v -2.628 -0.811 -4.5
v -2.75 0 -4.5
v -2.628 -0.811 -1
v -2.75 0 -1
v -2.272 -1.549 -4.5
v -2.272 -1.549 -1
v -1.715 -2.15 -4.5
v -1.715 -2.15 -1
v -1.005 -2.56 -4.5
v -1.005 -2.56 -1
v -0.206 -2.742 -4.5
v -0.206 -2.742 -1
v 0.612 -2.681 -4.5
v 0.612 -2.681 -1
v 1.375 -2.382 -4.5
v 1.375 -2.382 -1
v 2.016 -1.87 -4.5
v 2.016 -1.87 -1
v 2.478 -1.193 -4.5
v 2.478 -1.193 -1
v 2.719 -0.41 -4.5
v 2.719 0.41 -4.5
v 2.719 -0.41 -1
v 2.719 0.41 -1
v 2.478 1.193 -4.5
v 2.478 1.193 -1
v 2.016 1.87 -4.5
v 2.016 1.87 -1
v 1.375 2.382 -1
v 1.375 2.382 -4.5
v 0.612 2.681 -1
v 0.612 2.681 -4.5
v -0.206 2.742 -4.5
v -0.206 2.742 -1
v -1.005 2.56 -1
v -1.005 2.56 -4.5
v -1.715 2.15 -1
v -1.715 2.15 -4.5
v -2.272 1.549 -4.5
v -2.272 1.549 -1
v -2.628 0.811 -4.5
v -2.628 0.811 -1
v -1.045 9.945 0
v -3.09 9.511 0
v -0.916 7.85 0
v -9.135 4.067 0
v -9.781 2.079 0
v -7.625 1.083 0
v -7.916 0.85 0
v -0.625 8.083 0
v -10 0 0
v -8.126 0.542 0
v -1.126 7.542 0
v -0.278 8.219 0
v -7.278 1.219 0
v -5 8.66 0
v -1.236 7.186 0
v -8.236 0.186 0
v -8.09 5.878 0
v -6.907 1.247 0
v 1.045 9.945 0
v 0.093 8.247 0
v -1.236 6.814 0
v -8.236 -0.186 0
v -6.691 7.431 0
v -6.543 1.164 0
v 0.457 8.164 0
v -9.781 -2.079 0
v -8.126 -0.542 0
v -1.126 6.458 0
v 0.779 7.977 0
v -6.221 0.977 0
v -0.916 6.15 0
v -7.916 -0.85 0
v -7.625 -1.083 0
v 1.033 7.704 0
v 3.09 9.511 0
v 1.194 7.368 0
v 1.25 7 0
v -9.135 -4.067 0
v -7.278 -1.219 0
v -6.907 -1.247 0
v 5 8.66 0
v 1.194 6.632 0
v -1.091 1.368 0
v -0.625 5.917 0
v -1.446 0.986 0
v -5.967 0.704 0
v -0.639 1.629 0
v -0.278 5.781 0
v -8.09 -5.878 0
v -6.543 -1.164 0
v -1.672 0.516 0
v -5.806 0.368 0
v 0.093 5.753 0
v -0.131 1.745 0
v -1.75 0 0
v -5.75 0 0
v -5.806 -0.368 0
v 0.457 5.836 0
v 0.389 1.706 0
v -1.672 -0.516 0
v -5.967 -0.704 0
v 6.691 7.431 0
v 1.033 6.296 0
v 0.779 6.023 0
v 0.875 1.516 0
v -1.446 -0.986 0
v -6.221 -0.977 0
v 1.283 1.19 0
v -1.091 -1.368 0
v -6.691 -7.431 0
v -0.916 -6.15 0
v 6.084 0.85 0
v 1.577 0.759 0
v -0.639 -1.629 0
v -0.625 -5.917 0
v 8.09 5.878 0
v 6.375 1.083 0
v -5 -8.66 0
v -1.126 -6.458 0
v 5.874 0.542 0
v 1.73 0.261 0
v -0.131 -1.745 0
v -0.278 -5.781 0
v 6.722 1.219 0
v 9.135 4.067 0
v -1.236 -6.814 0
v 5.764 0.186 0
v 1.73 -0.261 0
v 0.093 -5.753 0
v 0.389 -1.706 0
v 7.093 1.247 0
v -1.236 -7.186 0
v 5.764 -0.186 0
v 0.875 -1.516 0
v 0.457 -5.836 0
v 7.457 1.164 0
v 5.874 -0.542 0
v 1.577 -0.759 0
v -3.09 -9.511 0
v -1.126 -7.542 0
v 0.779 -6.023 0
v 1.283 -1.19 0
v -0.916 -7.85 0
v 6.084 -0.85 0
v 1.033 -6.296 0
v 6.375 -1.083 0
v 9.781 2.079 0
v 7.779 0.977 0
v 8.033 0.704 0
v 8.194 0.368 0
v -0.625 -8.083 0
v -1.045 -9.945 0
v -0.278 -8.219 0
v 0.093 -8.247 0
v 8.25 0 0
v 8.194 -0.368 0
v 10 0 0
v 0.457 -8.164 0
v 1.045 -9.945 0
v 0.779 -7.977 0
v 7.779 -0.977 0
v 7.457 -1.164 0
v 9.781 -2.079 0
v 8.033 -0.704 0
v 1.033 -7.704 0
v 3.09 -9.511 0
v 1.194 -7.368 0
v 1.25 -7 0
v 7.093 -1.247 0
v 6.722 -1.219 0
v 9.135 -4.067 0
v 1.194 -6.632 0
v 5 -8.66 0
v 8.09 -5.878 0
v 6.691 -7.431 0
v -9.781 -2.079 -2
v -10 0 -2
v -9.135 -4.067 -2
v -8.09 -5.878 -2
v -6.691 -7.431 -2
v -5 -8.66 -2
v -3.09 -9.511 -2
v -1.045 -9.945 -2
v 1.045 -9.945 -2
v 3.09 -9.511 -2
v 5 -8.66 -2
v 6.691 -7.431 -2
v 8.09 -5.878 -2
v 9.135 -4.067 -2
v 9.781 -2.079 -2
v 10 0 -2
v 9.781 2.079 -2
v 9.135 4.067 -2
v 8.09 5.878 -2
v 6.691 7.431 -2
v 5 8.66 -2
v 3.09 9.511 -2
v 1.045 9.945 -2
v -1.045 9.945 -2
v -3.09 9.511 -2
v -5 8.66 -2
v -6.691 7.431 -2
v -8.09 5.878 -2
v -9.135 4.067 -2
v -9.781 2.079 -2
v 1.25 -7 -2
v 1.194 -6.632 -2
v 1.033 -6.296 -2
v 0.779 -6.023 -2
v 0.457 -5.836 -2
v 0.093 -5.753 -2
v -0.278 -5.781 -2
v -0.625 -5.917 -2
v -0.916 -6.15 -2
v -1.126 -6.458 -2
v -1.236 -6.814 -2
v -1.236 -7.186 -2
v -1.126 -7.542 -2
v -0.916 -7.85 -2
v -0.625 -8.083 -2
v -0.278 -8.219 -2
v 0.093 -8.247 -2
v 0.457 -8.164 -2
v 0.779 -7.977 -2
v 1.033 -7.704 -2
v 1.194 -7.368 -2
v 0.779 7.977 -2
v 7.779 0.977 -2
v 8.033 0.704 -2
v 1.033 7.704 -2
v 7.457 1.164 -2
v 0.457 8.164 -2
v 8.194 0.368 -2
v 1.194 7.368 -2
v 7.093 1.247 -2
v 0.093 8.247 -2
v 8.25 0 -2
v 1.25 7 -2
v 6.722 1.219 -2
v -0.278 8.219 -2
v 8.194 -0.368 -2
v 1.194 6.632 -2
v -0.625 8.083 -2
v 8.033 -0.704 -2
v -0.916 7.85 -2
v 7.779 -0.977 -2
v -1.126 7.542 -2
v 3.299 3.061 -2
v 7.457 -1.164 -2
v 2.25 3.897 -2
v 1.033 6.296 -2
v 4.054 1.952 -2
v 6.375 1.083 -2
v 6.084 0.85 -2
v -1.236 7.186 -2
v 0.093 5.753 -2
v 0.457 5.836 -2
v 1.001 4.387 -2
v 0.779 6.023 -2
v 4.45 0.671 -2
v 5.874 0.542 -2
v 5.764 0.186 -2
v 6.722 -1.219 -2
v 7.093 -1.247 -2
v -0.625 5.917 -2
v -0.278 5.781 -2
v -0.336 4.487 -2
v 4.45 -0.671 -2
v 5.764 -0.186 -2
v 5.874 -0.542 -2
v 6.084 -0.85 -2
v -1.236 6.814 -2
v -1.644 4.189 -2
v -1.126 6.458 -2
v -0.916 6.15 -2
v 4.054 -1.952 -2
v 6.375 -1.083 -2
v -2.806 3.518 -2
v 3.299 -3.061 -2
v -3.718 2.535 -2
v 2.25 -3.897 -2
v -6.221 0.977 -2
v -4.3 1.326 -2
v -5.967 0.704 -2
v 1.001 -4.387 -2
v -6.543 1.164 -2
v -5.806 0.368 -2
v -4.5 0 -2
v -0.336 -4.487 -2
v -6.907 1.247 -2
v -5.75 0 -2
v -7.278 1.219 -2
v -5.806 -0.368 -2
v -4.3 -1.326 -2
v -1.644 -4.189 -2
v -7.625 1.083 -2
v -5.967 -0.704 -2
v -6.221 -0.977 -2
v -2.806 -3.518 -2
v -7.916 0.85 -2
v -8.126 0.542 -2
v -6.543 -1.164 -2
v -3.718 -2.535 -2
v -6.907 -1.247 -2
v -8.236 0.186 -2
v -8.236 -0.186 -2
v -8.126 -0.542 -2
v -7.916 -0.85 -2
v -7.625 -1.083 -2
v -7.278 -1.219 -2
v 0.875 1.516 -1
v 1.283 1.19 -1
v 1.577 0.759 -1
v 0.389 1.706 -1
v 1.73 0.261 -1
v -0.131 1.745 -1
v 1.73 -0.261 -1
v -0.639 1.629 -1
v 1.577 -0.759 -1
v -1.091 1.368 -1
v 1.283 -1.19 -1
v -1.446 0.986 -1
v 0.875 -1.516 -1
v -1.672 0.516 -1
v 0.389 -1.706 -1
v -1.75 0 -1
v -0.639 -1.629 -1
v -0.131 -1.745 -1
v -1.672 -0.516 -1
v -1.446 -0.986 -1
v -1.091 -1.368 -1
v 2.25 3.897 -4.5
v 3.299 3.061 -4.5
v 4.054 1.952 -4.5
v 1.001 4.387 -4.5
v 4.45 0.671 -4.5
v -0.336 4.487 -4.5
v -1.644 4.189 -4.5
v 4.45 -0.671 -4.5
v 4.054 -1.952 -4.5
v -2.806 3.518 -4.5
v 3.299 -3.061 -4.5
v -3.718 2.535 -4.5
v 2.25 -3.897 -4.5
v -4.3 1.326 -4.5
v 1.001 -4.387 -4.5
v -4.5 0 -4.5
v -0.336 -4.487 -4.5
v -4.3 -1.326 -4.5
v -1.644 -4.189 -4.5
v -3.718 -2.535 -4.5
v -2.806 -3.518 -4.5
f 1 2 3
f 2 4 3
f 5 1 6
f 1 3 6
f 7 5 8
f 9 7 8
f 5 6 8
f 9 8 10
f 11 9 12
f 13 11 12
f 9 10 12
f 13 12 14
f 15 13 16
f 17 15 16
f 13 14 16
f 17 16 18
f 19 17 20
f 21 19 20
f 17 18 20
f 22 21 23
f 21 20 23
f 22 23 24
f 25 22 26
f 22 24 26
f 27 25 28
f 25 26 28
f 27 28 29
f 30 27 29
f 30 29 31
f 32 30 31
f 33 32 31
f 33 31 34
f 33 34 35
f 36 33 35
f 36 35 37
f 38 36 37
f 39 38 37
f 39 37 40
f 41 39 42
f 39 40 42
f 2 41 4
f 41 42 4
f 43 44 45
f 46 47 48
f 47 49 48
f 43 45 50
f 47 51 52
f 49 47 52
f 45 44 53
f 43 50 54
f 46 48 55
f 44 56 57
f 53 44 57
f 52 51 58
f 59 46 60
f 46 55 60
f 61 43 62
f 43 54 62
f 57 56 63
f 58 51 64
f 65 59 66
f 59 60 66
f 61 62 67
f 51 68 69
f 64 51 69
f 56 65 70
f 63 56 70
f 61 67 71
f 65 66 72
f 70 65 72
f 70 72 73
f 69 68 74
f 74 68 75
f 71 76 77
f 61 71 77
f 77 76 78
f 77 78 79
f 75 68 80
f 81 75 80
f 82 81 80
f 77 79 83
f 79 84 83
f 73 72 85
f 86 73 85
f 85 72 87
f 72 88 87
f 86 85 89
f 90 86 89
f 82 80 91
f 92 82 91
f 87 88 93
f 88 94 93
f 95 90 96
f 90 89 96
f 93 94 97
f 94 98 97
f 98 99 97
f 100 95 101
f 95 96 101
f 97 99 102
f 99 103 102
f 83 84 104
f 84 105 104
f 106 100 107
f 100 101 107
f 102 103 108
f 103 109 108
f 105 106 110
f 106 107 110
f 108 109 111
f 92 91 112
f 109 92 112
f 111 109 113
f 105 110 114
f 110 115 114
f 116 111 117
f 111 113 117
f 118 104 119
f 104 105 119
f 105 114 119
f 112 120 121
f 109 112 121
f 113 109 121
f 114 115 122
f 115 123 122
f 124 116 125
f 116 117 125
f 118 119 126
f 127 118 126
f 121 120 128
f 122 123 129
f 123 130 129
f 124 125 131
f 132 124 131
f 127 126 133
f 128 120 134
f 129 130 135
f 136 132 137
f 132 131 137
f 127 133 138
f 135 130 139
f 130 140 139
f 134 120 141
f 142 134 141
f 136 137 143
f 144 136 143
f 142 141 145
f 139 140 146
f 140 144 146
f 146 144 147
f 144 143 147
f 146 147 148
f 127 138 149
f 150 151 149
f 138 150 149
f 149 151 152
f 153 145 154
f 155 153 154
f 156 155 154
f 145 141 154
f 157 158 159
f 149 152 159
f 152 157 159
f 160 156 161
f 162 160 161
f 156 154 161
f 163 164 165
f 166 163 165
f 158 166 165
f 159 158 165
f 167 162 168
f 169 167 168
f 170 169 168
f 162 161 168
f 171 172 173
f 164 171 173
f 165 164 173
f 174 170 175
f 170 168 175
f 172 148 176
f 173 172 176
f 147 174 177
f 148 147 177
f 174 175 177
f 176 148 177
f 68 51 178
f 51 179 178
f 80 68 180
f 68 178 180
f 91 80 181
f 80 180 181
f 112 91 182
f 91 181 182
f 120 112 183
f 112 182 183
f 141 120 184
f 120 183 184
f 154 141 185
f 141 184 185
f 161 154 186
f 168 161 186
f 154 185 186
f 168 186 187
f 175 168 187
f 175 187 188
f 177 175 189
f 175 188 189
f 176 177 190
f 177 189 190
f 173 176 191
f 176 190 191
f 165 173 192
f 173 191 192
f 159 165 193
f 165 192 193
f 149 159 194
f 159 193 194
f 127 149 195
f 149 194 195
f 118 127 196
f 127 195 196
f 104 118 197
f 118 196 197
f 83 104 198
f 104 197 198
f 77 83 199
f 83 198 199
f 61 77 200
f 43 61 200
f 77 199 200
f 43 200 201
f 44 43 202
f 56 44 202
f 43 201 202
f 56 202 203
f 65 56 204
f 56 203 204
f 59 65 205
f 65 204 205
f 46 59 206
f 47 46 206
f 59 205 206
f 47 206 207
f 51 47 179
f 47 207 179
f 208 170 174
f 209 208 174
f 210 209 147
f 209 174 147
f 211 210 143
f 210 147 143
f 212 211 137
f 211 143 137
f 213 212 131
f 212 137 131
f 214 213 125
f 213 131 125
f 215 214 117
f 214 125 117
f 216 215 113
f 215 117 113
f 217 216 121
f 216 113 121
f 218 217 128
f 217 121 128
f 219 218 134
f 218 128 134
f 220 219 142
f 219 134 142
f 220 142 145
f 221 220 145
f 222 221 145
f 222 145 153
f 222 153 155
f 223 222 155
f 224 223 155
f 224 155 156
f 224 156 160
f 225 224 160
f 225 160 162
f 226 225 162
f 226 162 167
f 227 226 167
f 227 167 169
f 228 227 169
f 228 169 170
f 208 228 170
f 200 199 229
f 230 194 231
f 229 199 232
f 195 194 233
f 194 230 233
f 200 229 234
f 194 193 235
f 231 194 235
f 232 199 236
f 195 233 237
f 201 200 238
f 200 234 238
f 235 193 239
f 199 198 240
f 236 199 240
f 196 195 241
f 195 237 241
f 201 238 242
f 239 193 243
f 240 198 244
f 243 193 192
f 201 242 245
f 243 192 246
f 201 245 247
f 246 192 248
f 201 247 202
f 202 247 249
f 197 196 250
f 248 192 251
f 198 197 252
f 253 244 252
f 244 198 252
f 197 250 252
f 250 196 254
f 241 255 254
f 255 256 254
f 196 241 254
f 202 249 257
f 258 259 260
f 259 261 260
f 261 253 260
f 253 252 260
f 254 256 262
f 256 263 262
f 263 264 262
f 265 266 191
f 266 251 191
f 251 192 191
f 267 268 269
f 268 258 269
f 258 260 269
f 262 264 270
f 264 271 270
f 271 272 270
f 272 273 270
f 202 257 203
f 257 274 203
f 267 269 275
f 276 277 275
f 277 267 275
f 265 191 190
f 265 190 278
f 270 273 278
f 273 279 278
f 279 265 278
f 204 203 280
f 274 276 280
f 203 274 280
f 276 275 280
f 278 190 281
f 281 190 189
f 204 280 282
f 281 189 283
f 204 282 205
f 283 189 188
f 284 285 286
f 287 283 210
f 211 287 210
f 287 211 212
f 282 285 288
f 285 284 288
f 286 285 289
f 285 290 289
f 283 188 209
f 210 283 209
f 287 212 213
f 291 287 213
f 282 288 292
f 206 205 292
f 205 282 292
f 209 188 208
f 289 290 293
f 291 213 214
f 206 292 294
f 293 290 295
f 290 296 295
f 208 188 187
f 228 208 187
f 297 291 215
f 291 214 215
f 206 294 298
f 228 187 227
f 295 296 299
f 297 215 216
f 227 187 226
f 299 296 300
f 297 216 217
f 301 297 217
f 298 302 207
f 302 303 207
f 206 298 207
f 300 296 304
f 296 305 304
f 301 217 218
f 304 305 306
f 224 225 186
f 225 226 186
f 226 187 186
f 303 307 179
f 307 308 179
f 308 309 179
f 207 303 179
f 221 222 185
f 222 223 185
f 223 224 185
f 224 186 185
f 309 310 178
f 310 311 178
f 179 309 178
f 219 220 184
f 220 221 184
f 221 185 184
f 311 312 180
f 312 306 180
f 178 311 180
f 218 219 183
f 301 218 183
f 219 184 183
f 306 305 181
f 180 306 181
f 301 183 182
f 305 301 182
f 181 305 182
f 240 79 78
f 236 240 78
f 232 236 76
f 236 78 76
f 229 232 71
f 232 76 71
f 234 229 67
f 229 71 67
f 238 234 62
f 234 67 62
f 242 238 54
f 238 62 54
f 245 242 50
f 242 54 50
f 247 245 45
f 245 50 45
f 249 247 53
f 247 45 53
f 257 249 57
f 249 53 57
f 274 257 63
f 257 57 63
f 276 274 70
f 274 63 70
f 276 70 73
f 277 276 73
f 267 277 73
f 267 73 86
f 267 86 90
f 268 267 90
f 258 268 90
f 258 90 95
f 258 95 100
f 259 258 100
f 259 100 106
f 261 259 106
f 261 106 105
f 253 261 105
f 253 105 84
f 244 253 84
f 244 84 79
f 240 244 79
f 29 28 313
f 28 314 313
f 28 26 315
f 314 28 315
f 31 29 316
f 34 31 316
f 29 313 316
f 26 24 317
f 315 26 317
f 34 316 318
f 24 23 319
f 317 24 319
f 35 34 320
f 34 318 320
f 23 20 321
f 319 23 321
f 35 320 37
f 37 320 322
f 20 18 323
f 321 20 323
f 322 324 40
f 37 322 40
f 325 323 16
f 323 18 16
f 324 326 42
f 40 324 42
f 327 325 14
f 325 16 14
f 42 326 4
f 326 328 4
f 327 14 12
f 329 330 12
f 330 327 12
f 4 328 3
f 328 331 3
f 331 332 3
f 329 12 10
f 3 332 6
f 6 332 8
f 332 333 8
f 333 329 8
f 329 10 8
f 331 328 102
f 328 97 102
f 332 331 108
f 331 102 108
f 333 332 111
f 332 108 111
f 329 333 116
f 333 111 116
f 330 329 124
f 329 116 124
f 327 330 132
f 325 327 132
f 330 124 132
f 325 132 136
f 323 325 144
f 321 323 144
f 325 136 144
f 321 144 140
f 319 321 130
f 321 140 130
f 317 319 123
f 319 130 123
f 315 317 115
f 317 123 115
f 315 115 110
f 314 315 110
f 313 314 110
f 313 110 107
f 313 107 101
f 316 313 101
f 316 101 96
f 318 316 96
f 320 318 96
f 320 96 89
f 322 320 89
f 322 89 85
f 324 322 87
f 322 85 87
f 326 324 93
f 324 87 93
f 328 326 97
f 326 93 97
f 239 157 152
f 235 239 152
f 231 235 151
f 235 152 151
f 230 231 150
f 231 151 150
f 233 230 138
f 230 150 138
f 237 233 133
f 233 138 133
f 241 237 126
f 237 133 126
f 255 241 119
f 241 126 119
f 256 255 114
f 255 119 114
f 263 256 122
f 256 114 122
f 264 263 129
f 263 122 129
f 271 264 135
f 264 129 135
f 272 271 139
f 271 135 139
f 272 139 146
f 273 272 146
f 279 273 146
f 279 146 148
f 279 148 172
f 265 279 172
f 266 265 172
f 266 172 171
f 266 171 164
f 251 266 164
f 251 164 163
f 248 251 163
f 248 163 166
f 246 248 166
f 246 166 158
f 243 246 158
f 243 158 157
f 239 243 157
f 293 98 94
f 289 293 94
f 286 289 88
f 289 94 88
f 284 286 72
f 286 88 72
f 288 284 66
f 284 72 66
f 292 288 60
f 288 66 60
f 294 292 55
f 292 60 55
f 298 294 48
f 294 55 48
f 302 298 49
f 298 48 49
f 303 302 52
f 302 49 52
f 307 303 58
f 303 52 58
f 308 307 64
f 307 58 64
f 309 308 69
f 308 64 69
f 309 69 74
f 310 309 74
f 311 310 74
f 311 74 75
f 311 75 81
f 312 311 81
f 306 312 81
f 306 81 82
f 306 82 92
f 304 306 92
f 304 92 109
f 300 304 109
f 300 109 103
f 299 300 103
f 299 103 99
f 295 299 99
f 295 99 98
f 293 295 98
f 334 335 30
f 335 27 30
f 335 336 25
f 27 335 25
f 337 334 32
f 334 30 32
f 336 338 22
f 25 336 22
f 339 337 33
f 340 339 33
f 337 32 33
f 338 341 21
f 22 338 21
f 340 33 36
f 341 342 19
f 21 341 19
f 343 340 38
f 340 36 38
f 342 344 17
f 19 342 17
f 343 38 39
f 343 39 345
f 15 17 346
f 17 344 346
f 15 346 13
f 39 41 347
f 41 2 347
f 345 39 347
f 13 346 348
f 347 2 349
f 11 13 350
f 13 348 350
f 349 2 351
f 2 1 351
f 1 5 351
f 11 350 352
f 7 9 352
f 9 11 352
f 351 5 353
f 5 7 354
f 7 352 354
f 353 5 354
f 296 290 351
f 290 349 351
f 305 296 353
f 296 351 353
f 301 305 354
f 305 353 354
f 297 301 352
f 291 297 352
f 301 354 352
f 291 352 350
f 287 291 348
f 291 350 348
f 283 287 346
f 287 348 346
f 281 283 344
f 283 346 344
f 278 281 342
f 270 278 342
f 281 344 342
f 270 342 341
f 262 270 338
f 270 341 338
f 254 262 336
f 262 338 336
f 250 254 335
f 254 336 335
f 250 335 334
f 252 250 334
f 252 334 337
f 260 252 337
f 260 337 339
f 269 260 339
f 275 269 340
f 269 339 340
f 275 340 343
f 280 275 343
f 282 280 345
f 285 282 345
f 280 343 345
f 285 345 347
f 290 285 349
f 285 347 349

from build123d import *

# Parameters (mm, degrees)
M3X0_5_TAPPED_HOLE1_D = 2.5


with BuildPart() as part:
    # Sketch1 → Revolve1 (revolve)
    with BuildSketch(Plane(origin=(0, 0, 0), x_dir=(1, 0, 0), z_dir=(0, 1, 0))):
        Polygon((-1.75, 0), (-10, 0), (-10, 2), (-4.5, 2), (-4.5, 4.5), (-2.75, 4.5), (-2.75, 1), (-1.75, 1), align=None)
    revolve(axis=Axis((0, 0, -13.360266154), (0, 0, 1)))

    # M3x0.5 Tapped Hole1 (through all)
    with Locations(Plane(origin=(0, 0, -2), x_dir=(-1, 0, 0), z_dir=(0, 0, -1))):
        with Locations((0, 7), (7, 0), (0, -7), (-7, 0)):
            Hole(M3X0_5_TAPPED_HOLE1_D / 2)


solid = part.part
